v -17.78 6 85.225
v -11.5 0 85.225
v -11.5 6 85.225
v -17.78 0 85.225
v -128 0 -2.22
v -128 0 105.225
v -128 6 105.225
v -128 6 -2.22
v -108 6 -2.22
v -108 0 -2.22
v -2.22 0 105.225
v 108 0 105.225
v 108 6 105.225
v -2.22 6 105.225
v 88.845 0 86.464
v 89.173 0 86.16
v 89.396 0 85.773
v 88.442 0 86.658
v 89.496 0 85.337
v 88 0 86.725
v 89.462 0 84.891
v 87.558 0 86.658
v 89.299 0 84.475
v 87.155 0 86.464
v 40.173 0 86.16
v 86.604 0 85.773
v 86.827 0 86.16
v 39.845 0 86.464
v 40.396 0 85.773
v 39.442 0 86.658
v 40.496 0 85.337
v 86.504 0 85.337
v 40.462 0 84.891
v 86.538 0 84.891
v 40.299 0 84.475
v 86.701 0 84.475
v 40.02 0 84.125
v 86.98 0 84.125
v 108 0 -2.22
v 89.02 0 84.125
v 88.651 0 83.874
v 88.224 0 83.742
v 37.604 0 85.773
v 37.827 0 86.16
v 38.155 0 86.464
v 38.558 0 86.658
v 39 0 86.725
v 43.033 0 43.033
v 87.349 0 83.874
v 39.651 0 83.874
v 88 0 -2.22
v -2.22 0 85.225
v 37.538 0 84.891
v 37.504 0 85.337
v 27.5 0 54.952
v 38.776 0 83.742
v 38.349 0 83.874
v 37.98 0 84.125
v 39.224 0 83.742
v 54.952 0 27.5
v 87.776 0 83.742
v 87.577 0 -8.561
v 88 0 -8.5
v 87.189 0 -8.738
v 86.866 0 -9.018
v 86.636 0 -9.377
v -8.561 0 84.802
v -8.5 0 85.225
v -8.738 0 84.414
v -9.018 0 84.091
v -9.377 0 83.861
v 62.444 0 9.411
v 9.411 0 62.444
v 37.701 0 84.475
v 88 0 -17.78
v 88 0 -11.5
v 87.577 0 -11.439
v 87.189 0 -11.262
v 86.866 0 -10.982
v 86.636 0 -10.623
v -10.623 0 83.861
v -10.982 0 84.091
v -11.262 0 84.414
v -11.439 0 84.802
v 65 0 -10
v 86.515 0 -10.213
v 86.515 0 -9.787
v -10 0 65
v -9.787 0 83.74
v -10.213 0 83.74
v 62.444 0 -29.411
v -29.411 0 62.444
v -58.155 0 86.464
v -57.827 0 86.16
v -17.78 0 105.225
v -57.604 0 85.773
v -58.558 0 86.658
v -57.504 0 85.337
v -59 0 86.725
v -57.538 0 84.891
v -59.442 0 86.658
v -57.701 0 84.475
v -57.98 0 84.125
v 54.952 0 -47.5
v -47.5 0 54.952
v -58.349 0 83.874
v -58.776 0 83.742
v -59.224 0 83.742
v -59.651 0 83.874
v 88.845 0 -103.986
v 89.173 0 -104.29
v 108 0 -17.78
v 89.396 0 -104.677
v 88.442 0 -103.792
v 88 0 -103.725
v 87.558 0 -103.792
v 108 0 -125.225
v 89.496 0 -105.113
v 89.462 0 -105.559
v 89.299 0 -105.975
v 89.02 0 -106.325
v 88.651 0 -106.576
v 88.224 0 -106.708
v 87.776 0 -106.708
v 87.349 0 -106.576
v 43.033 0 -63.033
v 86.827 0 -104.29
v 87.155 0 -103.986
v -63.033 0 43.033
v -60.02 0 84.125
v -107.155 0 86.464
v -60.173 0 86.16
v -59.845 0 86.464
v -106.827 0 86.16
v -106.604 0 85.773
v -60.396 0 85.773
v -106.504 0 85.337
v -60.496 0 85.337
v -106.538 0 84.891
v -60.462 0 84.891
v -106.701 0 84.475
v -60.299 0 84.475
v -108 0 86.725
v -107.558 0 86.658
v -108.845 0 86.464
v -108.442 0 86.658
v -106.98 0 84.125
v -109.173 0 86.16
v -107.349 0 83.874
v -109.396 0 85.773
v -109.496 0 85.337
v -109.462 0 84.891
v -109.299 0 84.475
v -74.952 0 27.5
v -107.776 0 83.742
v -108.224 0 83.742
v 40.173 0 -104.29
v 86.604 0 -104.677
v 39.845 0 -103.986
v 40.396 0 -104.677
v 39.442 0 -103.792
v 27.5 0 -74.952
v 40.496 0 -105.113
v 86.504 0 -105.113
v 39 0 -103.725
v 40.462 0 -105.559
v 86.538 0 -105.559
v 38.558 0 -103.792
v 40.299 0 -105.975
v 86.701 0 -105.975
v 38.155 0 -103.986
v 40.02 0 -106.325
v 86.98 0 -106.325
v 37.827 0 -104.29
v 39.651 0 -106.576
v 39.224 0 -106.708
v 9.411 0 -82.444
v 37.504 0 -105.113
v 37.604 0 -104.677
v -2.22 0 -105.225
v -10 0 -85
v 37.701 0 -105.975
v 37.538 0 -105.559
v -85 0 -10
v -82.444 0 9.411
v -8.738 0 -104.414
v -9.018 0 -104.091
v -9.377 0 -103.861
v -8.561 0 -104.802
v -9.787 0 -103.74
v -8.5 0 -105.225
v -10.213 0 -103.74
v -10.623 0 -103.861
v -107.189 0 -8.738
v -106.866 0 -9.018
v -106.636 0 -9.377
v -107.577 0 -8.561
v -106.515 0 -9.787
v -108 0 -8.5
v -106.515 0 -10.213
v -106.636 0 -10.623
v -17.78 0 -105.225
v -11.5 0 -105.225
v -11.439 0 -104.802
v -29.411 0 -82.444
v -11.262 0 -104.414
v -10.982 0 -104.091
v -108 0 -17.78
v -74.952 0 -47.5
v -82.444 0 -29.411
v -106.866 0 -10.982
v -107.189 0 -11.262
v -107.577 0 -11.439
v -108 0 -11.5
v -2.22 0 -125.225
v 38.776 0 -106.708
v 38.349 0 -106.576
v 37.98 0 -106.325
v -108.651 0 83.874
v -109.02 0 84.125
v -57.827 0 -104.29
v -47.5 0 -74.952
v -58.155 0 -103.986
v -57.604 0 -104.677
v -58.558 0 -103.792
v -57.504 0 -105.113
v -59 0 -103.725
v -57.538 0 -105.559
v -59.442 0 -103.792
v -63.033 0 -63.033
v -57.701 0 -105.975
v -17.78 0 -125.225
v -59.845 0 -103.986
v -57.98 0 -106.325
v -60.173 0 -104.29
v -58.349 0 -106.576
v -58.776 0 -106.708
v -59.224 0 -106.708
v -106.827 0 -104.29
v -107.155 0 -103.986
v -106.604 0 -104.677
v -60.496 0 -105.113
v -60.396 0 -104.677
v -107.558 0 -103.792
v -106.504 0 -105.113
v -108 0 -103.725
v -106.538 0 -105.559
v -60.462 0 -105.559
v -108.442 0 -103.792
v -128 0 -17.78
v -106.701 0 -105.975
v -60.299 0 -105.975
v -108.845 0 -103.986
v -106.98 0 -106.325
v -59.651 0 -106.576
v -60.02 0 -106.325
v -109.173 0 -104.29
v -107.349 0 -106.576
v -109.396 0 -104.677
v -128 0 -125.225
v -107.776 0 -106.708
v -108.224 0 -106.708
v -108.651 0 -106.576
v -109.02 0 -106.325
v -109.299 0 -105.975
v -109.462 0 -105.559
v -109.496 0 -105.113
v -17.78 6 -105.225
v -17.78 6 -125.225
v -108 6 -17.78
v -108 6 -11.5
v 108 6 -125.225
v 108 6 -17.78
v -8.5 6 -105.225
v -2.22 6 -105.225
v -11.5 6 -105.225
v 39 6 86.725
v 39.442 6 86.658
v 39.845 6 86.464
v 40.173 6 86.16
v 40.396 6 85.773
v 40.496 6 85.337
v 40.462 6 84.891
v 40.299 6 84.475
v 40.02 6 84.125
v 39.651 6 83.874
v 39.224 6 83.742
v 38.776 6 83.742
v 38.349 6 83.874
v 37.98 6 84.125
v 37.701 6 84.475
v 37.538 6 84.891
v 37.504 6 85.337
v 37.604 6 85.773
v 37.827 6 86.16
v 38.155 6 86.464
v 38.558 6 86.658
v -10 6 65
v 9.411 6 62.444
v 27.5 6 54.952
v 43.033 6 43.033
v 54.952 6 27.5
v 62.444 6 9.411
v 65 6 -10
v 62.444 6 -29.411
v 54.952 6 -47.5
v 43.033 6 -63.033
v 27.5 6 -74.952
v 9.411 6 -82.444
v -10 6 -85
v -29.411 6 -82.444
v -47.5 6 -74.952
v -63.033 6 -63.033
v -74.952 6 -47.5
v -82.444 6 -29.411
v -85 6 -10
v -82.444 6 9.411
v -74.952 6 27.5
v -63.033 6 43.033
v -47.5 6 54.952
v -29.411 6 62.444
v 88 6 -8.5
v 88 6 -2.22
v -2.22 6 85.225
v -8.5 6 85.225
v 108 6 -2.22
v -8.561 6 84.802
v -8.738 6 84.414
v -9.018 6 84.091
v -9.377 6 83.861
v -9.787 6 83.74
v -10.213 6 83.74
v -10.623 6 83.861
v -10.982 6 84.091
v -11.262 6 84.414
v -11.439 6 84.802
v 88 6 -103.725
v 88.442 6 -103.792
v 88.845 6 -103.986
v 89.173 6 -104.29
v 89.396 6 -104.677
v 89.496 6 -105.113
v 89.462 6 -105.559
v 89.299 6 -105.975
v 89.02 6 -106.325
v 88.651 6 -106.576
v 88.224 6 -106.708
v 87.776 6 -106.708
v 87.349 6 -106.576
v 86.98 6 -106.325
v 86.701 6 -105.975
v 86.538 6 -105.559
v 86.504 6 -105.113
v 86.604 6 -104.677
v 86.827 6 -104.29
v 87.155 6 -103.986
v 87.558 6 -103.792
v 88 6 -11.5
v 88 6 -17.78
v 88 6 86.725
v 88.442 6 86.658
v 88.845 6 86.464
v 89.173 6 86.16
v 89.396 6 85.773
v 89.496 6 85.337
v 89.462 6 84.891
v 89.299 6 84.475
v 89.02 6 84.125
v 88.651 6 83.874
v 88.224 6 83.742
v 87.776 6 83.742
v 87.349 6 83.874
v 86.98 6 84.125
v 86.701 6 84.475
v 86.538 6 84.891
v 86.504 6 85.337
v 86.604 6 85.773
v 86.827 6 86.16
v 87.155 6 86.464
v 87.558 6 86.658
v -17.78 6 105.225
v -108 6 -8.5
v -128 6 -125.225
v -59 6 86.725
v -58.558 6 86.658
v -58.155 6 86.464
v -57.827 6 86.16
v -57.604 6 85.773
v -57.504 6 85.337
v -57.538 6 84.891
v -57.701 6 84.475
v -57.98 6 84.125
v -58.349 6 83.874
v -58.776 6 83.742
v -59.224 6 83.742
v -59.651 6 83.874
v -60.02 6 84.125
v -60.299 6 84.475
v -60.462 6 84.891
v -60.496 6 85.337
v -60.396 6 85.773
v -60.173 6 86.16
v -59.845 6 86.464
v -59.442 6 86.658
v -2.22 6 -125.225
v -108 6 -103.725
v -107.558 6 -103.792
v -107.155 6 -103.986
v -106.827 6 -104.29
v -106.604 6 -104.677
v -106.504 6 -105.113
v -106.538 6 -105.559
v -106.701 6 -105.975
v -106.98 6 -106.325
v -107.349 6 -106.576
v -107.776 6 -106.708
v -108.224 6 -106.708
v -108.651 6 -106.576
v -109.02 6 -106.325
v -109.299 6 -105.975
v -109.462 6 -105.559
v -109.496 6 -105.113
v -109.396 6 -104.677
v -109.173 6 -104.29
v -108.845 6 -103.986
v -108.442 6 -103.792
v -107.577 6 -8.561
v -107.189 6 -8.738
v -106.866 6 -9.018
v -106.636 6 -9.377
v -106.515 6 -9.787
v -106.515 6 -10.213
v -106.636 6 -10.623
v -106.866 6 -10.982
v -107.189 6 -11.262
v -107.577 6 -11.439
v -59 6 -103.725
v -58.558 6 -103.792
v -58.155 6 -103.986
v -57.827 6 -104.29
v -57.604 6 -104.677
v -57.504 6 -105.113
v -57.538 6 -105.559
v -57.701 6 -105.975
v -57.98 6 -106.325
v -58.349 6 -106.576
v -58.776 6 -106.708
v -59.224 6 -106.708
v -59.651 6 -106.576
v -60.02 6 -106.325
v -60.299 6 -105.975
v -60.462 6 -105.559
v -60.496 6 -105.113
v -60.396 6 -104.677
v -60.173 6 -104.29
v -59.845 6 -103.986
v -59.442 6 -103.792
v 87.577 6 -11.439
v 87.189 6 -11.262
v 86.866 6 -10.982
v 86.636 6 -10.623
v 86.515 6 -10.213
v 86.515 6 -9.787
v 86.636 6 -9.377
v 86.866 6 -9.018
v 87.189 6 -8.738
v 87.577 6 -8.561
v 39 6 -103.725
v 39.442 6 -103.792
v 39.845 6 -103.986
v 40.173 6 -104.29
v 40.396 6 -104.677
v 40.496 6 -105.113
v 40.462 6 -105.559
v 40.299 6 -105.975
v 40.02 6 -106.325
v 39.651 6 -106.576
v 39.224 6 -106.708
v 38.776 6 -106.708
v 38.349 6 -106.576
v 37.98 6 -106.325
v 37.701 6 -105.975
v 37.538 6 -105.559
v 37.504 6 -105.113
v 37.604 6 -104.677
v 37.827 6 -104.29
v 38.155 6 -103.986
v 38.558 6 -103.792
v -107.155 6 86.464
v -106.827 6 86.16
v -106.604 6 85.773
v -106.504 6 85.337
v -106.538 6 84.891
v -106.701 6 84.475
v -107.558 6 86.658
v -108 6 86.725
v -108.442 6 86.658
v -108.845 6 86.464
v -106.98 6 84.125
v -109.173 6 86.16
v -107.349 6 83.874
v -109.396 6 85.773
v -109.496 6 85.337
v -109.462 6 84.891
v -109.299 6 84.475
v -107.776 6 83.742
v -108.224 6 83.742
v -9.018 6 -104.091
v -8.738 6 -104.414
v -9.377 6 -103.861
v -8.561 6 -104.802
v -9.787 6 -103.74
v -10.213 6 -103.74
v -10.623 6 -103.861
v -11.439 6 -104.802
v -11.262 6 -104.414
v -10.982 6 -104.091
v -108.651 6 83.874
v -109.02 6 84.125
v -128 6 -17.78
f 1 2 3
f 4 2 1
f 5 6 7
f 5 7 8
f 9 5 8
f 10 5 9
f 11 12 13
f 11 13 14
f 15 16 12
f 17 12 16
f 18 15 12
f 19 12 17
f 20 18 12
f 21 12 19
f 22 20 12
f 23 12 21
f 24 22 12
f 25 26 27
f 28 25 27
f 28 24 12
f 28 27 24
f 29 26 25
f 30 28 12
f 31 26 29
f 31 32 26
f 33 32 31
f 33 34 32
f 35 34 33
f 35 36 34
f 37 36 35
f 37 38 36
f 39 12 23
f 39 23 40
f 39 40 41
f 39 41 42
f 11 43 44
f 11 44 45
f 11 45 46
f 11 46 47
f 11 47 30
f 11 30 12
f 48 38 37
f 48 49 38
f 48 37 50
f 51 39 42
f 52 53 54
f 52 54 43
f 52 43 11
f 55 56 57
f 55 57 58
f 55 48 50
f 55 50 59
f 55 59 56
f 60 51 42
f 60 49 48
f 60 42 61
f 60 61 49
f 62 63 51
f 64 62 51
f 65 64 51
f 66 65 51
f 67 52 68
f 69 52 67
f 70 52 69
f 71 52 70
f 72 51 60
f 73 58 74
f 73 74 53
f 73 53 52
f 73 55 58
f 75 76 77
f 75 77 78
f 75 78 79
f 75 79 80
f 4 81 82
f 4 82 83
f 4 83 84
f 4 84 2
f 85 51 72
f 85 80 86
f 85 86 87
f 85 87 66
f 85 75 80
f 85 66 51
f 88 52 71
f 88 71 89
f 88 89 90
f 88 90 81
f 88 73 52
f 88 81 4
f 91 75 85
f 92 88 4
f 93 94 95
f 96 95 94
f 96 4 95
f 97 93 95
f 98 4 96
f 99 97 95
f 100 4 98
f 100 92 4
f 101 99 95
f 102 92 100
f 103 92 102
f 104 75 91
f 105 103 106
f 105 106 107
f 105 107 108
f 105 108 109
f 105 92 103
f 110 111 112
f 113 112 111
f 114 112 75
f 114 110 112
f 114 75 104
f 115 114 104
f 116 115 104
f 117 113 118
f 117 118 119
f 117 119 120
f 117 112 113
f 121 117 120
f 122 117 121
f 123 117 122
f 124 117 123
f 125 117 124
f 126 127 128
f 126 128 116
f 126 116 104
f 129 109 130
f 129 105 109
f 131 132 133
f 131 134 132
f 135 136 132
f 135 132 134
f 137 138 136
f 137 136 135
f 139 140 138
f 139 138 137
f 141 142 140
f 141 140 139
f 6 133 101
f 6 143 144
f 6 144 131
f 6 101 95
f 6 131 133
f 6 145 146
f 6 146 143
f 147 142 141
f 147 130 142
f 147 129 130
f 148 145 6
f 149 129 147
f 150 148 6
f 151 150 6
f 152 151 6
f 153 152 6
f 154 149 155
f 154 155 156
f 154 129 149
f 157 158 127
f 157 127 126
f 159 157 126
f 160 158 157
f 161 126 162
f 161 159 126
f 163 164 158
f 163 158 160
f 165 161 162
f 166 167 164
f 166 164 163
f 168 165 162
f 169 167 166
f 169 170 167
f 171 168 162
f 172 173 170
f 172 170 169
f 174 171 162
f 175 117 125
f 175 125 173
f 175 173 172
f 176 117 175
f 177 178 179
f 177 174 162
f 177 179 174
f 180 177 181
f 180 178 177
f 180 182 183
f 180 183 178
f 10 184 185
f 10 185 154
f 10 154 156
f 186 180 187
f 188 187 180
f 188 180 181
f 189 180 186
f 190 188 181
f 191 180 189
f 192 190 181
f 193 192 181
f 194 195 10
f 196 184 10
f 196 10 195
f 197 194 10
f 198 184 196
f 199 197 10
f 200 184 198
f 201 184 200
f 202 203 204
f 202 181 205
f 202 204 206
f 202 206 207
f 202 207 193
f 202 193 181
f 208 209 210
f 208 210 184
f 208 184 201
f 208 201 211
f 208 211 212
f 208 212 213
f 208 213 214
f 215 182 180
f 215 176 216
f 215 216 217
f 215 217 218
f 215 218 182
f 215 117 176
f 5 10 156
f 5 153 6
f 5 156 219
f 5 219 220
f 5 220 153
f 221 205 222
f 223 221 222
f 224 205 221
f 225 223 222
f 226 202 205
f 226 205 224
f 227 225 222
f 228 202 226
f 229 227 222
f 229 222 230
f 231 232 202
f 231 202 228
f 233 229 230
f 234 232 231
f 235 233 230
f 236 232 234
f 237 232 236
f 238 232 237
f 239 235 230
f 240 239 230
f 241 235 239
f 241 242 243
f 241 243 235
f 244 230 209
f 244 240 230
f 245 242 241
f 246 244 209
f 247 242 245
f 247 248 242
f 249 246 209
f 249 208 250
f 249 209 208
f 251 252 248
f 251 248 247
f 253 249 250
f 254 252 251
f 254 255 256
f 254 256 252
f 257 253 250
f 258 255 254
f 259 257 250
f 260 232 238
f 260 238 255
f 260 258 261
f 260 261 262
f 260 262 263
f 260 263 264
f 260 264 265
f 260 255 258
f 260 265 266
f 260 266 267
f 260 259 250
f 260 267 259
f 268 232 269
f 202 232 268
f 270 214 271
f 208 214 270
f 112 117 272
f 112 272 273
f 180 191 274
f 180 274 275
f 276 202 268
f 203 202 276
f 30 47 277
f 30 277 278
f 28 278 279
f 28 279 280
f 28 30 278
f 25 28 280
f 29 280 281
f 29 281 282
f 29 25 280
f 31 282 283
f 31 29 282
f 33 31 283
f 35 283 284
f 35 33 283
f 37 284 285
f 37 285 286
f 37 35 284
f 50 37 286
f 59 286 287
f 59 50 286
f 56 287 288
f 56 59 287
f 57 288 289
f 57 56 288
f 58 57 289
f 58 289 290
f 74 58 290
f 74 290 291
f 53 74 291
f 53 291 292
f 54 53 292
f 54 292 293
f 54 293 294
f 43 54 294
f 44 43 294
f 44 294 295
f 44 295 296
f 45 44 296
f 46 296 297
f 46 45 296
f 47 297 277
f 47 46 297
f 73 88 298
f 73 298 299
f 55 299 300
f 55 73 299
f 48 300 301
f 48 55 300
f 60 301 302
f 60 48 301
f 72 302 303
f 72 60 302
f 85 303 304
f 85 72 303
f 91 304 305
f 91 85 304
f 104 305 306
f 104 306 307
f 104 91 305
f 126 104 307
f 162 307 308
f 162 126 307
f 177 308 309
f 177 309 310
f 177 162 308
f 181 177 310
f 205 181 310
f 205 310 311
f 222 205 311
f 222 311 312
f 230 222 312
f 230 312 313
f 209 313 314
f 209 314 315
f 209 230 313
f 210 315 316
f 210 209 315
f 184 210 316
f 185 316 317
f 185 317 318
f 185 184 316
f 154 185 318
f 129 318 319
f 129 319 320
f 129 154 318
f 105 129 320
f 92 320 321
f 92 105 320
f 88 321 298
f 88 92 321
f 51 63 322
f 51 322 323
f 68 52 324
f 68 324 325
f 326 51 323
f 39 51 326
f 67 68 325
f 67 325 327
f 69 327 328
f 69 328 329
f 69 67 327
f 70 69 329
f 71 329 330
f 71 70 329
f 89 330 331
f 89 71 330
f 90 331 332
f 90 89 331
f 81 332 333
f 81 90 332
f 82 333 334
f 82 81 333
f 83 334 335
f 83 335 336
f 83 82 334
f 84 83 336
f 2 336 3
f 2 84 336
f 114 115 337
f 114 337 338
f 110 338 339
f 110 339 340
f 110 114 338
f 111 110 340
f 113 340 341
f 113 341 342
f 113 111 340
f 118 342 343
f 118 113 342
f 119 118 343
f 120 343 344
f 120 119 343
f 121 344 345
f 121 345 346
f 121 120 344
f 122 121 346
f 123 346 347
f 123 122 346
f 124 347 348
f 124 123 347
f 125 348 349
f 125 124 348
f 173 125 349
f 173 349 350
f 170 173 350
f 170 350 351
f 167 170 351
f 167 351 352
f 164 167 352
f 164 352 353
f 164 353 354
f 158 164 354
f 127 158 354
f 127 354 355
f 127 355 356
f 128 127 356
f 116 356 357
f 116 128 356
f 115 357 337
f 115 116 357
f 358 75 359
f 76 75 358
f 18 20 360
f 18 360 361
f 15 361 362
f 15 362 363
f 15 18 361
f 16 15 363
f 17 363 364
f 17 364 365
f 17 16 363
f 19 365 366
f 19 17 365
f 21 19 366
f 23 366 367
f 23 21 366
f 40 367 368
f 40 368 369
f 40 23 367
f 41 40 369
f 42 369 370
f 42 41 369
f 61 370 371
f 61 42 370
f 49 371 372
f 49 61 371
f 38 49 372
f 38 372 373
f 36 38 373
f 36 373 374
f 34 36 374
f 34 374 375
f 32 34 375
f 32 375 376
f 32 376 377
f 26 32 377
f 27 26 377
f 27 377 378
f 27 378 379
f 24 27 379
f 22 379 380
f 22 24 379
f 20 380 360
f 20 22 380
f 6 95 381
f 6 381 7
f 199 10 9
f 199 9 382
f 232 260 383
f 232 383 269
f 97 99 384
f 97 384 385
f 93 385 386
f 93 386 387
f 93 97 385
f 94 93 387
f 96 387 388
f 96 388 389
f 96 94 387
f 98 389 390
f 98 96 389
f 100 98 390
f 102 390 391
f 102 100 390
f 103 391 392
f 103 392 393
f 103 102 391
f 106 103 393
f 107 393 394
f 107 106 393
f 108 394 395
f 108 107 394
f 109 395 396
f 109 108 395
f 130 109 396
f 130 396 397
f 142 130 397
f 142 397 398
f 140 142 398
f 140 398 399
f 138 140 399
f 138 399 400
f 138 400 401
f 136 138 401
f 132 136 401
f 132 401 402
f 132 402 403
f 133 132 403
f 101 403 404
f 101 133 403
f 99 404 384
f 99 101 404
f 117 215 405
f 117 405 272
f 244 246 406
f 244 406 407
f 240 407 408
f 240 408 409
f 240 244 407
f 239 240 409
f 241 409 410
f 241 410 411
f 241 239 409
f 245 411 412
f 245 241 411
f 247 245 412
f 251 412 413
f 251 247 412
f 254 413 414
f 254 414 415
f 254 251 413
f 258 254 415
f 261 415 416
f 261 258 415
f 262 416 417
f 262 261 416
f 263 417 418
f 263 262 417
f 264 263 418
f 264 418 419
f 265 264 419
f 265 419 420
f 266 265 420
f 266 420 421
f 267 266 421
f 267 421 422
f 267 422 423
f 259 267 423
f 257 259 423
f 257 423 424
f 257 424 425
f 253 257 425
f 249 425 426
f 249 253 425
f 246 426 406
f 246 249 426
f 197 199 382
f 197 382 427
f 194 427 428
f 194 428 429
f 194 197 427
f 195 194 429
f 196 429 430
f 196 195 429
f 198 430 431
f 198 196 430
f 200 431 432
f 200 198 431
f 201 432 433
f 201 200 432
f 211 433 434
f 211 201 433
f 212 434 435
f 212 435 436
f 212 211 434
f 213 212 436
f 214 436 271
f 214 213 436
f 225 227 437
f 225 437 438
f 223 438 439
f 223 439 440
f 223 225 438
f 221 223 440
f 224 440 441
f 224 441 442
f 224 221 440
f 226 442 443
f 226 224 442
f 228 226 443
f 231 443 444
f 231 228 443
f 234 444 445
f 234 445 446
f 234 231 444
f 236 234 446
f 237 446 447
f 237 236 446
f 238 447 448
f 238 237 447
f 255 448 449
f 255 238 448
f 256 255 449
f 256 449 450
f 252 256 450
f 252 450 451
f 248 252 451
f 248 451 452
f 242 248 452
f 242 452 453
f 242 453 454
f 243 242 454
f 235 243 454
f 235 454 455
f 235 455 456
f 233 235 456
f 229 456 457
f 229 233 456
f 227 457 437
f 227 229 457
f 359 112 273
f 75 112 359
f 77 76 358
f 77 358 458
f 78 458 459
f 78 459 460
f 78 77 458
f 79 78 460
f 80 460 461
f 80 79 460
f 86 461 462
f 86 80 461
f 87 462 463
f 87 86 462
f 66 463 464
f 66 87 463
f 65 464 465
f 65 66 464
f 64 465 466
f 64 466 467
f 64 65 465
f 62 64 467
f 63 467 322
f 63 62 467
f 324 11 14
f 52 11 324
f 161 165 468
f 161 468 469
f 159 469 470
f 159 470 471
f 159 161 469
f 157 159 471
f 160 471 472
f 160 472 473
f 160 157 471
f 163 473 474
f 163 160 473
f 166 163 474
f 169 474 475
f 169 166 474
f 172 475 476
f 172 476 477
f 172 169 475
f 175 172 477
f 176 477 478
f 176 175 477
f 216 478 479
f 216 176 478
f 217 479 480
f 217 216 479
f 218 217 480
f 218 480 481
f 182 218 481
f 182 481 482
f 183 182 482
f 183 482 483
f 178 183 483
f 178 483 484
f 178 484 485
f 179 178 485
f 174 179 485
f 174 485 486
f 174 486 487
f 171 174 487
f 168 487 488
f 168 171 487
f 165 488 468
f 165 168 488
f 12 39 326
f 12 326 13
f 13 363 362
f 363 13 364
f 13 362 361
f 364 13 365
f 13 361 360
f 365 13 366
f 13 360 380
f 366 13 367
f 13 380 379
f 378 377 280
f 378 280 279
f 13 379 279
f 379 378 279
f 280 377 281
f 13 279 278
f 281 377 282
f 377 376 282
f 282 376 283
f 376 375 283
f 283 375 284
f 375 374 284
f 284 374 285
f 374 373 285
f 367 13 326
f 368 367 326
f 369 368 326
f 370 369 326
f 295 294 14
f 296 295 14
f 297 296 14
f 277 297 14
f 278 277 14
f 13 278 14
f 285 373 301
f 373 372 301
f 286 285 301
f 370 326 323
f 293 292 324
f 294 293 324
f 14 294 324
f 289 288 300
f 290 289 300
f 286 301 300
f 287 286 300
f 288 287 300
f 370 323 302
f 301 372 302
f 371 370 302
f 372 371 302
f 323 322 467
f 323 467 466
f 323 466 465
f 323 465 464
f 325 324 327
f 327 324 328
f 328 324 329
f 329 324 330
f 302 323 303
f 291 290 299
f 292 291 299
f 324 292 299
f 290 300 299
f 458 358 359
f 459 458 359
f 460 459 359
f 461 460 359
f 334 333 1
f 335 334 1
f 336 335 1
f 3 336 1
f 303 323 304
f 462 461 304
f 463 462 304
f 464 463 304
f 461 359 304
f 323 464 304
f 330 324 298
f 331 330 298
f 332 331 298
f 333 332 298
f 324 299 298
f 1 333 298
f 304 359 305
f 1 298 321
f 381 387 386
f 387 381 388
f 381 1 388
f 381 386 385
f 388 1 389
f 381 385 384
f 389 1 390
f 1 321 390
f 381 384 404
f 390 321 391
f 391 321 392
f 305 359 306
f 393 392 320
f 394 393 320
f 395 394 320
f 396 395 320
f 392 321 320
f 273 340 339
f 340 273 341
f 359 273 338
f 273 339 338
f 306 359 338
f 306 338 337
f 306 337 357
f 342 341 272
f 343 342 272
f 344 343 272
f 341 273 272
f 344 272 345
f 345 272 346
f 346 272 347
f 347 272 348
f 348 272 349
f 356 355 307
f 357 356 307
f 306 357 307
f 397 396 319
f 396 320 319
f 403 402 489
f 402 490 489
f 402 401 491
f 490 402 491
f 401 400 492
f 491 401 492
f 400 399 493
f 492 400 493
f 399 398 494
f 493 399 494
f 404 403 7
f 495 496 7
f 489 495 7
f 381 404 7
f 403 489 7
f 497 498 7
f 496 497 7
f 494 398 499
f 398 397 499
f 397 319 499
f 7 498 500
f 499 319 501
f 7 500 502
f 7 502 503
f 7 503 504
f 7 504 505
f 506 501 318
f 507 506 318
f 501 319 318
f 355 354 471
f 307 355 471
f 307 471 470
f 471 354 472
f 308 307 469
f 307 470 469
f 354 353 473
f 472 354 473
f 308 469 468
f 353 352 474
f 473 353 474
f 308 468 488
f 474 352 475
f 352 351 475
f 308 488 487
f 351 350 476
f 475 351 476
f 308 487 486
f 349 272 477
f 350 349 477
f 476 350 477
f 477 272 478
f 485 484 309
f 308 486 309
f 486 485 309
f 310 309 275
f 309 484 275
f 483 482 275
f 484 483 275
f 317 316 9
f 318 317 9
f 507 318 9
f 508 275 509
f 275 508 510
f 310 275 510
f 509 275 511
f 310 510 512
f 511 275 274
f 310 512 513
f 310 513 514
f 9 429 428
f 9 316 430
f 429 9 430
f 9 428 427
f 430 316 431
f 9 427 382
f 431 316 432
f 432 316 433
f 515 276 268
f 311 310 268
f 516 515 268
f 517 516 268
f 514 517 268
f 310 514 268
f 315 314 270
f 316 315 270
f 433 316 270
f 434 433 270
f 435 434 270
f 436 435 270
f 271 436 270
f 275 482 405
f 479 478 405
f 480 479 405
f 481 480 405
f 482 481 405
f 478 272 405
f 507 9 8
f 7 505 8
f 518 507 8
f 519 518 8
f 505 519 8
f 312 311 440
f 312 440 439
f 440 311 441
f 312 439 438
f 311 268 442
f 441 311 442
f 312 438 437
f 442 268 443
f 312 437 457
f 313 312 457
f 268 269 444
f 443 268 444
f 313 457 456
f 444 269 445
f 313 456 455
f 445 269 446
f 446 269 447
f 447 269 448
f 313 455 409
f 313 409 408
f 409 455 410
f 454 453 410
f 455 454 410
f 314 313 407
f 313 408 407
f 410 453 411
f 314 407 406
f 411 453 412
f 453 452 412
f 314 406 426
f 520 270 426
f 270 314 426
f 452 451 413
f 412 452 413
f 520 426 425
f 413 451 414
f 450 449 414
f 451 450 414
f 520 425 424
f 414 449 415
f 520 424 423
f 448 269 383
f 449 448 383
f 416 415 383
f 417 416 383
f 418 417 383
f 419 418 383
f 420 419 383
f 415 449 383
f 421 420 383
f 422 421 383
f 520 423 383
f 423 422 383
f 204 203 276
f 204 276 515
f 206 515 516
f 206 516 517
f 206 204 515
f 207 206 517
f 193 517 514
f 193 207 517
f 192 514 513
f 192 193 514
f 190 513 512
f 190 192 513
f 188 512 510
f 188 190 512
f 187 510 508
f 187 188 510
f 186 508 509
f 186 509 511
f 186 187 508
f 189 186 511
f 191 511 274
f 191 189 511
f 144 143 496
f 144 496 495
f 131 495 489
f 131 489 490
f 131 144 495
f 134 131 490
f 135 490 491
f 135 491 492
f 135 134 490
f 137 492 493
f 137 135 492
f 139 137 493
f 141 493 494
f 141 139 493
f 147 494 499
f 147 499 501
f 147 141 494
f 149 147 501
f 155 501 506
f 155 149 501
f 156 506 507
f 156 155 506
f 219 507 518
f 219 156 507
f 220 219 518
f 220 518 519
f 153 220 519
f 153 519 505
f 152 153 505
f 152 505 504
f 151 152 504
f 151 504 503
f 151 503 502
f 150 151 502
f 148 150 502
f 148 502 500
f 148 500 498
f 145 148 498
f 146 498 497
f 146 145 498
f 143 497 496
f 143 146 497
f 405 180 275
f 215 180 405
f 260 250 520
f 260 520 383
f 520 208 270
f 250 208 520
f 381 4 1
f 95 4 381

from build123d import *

# Parameters (mm, degrees)
SKETCH_1_R      = 1.5
SKETCH_1_R_2    = 75
EXTRUDE_1_DEPTH = 6


with BuildPart() as part:
    # 草图1 → 凸台-拉伸1 (new body)
    with BuildSketch(Plane(origin=(0, 0, 0), x_dir=(1, 0, 0), z_dir=(0, 1, 0))):
        with BuildLine():
            Line((-128, 125.225), (-17.78, 125.225))
            Line((-17.78, 125.225), (-17.78, 105.225))
            Line((-17.78, 105.225), (-15, 105.225))
            Line((-15, 105.225), (-11.5, 105.225))
            ThreePointArc((-11.5, 105.225), (-10, 103.725), (-8.5, 105.225))
            Line((-8.5, 105.225), (-5, 105.225))
            Line((-5, 105.225), (-2.22, 105.225))
            Line((-2.22, 105.225), (-2.22, 125.225))
            Line((-2.22, 125.225), (108, 125.225))
            Line((108, 125.225), (108, 17.78))
            Line((108, 17.78), (88, 17.78))
            Line((88, 17.78), (88, 15))
            Line((88, 15), (88, 11.5))
            ThreePointArc((88, 11.5), (86.5, 10), (88, 8.5))
            Line((88, 8.5), (88, 5))
            Line((88, 5), (88, 2.22))
            Line((88, 2.22), (108, 2.22))
            Line((108, 2.22), (108, -105.225))
            Line((108, -105.225), (-2.22, -105.225))
            Line((-2.22, -105.225), (-2.22, -85.225))
            Line((-2.22, -85.225), (-5, -85.225))
            Line((-5, -85.225), (-8.5, -85.225))
            ThreePointArc((-8.5, -85.225), (-10, -83.725), (-11.5, -85.225))
            Line((-11.5, -85.225), (-15, -85.225))
            Line((-15, -85.225), (-17.78, -85.225))
            Line((-17.78, -85.225), (-17.78, -105.225))
            Line((-17.78, -105.225), (-128, -105.225))
            Line((-128, -105.225), (-128, 2.22))
            Line((-128, 2.22), (-108, 2.22))
            Line((-108, 2.22), (-108, 5))
            Line((-108, 5), (-108, 8.5))
            ThreePointArc((-108, 8.5), (-106.5, 10), (-108, 11.5))
            Line((-108, 11.5), (-108, 15))
            Line((-108, 15), (-108, 17.78))
            Line((-108, 17.78), (-128, 17.78))
            Line((-128, 17.78), (-128, 125.225))
        make_face()
        with Locations(Location((-108, 105.225, 0), (0, 0, 270))):
            Circle(SKETCH_1_R, mode=Mode.SUBTRACT)
        with Locations(Location((-59, 105.225, 0), (0, 0, 270))):
            Circle(SKETCH_1_R, mode=Mode.SUBTRACT)
        with Locations(Location((39, 105.225, 0), (0, 0, 270))):
            Circle(SKETCH_1_R, mode=Mode.SUBTRACT)
        with Locations(Location((88, 105.225, 0), (0, 0, 270))):
            Circle(SKETCH_1_R, mode=Mode.SUBTRACT)
        with Locations(Location((-108, -85.225, 0), (0, 0, 270))):
            Circle(SKETCH_1_R, mode=Mode.SUBTRACT)
        with Locations(Location((-59, -85.225, 0), (0, 0, 270))):
            Circle(SKETCH_1_R, mode=Mode.SUBTRACT)
        with Locations(Location((39, -85.225, 0), (0, 0, 270))):
            Circle(SKETCH_1_R, mode=Mode.SUBTRACT)
        with Locations(Location((88, -85.225, 0), (0, 0, 270))):
            Circle(SKETCH_1_R, mode=Mode.SUBTRACT)
        with Locations(Location((-10, 10, 0), (0, 0, 270))):
            Circle(SKETCH_1_R_2, mode=Mode.SUBTRACT)
    extrude(amount=EXTRUDE_1_DEPTH)


solid = part.part
